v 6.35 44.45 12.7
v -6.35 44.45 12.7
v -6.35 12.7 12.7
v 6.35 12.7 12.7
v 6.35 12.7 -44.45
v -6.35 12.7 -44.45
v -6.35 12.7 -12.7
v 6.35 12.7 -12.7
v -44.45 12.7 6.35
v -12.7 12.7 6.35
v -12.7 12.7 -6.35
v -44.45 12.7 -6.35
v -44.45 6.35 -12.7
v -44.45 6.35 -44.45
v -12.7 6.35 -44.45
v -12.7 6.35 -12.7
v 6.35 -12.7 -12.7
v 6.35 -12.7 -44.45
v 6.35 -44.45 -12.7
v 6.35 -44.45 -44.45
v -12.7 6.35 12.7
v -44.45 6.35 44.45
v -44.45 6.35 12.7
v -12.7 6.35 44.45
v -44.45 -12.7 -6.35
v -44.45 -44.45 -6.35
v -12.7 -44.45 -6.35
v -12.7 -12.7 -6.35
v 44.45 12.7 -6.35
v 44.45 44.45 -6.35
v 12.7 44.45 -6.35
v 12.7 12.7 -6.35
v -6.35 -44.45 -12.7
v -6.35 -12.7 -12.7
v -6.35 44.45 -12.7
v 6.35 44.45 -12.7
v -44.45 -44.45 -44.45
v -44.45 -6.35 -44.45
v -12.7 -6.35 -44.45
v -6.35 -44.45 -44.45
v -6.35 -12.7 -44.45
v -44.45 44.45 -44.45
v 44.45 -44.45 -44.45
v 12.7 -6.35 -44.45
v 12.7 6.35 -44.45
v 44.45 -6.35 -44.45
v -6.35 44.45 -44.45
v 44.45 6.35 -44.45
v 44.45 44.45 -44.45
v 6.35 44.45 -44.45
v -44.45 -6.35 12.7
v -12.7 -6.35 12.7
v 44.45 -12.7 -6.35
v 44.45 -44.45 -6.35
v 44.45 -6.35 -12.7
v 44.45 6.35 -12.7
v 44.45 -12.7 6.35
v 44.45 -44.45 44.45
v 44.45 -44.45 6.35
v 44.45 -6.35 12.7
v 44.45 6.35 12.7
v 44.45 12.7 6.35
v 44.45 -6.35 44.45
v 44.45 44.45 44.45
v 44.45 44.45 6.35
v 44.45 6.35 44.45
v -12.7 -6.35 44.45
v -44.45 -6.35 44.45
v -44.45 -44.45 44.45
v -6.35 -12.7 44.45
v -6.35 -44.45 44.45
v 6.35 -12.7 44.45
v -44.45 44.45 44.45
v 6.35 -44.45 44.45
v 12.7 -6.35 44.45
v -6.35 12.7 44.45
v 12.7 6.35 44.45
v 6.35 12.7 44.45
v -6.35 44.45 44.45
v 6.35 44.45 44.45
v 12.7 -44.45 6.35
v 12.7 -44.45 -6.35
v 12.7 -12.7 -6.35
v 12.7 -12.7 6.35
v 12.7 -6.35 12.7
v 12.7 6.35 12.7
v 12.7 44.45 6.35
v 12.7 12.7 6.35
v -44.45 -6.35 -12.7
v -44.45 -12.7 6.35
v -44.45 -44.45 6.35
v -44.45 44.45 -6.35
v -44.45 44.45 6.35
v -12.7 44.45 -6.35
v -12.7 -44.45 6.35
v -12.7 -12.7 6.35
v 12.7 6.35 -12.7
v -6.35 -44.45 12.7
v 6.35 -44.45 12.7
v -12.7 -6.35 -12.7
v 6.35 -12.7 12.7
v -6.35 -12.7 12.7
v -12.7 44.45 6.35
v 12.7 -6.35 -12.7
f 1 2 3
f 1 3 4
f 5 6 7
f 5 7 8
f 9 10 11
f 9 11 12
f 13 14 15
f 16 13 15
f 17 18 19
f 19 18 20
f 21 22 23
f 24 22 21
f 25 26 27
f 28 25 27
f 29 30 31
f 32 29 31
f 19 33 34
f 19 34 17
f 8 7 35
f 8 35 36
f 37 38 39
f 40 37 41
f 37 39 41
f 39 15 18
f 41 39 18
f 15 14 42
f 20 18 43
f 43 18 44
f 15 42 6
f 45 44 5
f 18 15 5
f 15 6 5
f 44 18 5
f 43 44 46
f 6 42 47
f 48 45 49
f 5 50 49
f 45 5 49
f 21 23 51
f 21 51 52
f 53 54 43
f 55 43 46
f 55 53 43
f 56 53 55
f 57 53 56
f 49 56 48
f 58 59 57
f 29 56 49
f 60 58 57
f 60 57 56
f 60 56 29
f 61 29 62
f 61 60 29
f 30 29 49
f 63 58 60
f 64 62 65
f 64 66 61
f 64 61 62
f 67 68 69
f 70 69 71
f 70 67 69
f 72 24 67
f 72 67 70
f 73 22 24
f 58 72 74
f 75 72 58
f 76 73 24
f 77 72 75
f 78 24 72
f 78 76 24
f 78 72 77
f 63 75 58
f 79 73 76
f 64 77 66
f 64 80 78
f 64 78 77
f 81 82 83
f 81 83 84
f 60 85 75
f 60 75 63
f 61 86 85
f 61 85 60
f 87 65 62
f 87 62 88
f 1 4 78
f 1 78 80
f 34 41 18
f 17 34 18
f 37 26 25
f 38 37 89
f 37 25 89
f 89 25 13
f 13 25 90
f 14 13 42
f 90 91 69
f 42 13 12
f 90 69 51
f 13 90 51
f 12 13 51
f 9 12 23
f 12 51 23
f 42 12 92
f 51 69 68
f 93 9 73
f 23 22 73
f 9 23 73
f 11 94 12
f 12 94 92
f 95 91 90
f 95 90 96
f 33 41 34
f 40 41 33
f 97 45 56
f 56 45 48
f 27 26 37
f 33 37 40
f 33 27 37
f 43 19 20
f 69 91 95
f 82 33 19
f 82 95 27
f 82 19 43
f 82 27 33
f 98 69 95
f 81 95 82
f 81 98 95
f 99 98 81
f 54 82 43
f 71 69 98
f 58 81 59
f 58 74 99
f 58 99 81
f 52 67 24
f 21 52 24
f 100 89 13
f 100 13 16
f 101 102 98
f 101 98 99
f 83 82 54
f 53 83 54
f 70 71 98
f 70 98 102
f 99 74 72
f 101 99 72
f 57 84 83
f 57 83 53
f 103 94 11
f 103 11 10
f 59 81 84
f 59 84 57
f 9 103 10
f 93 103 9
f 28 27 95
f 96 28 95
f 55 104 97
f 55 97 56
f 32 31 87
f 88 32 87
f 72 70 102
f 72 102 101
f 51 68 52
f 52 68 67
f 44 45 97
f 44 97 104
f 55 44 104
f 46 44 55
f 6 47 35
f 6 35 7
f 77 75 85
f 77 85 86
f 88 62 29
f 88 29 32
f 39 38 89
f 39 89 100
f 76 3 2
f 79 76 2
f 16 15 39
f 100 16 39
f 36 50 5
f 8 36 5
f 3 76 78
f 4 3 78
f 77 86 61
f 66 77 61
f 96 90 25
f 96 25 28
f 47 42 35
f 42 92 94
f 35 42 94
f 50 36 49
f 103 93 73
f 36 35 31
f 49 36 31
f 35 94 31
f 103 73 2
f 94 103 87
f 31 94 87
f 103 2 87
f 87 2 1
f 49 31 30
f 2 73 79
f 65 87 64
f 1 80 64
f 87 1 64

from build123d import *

# Parameters (mm, degrees)
F0_W     = 88.9
F0_H     = 88.9
F1_DEPTH = 44.45
F2_W     = 35.494227
F2_H     = 12.7
F2_W_2   = 12.7
F2_H_2   = 43.843563
F2_W_3   = 49.659715
F2_H_3   = 53.186459
F3_DEPTH = 31.75
F4_W     = 43.534182
F4_H     = 12.7
F4_W_2   = 12.7
F4_H_2   = 43.534182
F5_DEPTH = 31.75
F6_W     = 39.738709
F6_H     = 12.7
F6_W_2   = 51.209684
F7_DEPTH = 31.75
F8_W     = 39.158334
F8_H     = 12.7
F8_W_2   = 39.793333
F9_DEPTH = 31.75


with BuildPart() as f1:
    # F0 (on Top) → F1 (new body, symmetric)
    with BuildSketch(Plane.XY):
        Rectangle(F0_W, F0_H)
    extrude(amount=F1_DEPTH, both=True)

    # F2 (on face) → F3 (cut)
    with BuildSketch(Plane.XY.offset(44.45)):
        with Locations((30.447114, 0)):
            Rectangle(F2_W, F2_H)
        with Locations((0, -34.621781)):
            Rectangle(F2_W_2, F2_H_2)
        with Locations((-37.529857, 0)):
            Rectangle(F2_W_3, F2_H)
        with Locations((0, 39.29323)):
            Rectangle(F2_W_2, F2_H_3)
    extrude(amount=-F3_DEPTH, mode=Mode.SUBTRACT)

    # F4 (on face) → F5 (cut)
    with BuildSketch(Plane(origin=(0, 0, -44.45), x_dir=(1, 0, 0), z_dir=(0, 0, -1))):
        with Locations((34.467091, 0)):
            Rectangle(F4_W, F4_H)
        with Locations((0, 34.467091)):
            Rectangle(F4_W_2, F4_H_2)
        with Locations((-34.467091, 0)):
            Rectangle(F4_W, F4_H)
        with Locations((0, -34.467091)):
            Rectangle(F4_W_2, F4_H_2)
    extrude(amount=-F5_DEPTH, mode=Mode.SUBTRACT)

    # F6 (on face) → F7 (cut)
    with BuildSketch(Plane.XZ.offset(44.45)):
        with Locations((32.569354, 0)):
            Rectangle(F6_W, F6_H)
        with Locations((-38.304842, 0)):
            Rectangle(F6_W_2, F6_H)
    extrude(amount=-F7_DEPTH, mode=Mode.SUBTRACT)

    # F8 (on face) → F9 (cut)
    with BuildSketch(Plane(origin=(0, 44.45, 0), x_dir=(-1, 0, 0), z_dir=(0, 1, 0))):
        with Locations((32.279167, 0)):
            Rectangle(F8_W, F8_H)
        with Locations((-32.596666, 0)):
            Rectangle(F8_W_2, F8_H)
    extrude(amount=-F9_DEPTH, mode=Mode.SUBTRACT)


solid = f1.part
